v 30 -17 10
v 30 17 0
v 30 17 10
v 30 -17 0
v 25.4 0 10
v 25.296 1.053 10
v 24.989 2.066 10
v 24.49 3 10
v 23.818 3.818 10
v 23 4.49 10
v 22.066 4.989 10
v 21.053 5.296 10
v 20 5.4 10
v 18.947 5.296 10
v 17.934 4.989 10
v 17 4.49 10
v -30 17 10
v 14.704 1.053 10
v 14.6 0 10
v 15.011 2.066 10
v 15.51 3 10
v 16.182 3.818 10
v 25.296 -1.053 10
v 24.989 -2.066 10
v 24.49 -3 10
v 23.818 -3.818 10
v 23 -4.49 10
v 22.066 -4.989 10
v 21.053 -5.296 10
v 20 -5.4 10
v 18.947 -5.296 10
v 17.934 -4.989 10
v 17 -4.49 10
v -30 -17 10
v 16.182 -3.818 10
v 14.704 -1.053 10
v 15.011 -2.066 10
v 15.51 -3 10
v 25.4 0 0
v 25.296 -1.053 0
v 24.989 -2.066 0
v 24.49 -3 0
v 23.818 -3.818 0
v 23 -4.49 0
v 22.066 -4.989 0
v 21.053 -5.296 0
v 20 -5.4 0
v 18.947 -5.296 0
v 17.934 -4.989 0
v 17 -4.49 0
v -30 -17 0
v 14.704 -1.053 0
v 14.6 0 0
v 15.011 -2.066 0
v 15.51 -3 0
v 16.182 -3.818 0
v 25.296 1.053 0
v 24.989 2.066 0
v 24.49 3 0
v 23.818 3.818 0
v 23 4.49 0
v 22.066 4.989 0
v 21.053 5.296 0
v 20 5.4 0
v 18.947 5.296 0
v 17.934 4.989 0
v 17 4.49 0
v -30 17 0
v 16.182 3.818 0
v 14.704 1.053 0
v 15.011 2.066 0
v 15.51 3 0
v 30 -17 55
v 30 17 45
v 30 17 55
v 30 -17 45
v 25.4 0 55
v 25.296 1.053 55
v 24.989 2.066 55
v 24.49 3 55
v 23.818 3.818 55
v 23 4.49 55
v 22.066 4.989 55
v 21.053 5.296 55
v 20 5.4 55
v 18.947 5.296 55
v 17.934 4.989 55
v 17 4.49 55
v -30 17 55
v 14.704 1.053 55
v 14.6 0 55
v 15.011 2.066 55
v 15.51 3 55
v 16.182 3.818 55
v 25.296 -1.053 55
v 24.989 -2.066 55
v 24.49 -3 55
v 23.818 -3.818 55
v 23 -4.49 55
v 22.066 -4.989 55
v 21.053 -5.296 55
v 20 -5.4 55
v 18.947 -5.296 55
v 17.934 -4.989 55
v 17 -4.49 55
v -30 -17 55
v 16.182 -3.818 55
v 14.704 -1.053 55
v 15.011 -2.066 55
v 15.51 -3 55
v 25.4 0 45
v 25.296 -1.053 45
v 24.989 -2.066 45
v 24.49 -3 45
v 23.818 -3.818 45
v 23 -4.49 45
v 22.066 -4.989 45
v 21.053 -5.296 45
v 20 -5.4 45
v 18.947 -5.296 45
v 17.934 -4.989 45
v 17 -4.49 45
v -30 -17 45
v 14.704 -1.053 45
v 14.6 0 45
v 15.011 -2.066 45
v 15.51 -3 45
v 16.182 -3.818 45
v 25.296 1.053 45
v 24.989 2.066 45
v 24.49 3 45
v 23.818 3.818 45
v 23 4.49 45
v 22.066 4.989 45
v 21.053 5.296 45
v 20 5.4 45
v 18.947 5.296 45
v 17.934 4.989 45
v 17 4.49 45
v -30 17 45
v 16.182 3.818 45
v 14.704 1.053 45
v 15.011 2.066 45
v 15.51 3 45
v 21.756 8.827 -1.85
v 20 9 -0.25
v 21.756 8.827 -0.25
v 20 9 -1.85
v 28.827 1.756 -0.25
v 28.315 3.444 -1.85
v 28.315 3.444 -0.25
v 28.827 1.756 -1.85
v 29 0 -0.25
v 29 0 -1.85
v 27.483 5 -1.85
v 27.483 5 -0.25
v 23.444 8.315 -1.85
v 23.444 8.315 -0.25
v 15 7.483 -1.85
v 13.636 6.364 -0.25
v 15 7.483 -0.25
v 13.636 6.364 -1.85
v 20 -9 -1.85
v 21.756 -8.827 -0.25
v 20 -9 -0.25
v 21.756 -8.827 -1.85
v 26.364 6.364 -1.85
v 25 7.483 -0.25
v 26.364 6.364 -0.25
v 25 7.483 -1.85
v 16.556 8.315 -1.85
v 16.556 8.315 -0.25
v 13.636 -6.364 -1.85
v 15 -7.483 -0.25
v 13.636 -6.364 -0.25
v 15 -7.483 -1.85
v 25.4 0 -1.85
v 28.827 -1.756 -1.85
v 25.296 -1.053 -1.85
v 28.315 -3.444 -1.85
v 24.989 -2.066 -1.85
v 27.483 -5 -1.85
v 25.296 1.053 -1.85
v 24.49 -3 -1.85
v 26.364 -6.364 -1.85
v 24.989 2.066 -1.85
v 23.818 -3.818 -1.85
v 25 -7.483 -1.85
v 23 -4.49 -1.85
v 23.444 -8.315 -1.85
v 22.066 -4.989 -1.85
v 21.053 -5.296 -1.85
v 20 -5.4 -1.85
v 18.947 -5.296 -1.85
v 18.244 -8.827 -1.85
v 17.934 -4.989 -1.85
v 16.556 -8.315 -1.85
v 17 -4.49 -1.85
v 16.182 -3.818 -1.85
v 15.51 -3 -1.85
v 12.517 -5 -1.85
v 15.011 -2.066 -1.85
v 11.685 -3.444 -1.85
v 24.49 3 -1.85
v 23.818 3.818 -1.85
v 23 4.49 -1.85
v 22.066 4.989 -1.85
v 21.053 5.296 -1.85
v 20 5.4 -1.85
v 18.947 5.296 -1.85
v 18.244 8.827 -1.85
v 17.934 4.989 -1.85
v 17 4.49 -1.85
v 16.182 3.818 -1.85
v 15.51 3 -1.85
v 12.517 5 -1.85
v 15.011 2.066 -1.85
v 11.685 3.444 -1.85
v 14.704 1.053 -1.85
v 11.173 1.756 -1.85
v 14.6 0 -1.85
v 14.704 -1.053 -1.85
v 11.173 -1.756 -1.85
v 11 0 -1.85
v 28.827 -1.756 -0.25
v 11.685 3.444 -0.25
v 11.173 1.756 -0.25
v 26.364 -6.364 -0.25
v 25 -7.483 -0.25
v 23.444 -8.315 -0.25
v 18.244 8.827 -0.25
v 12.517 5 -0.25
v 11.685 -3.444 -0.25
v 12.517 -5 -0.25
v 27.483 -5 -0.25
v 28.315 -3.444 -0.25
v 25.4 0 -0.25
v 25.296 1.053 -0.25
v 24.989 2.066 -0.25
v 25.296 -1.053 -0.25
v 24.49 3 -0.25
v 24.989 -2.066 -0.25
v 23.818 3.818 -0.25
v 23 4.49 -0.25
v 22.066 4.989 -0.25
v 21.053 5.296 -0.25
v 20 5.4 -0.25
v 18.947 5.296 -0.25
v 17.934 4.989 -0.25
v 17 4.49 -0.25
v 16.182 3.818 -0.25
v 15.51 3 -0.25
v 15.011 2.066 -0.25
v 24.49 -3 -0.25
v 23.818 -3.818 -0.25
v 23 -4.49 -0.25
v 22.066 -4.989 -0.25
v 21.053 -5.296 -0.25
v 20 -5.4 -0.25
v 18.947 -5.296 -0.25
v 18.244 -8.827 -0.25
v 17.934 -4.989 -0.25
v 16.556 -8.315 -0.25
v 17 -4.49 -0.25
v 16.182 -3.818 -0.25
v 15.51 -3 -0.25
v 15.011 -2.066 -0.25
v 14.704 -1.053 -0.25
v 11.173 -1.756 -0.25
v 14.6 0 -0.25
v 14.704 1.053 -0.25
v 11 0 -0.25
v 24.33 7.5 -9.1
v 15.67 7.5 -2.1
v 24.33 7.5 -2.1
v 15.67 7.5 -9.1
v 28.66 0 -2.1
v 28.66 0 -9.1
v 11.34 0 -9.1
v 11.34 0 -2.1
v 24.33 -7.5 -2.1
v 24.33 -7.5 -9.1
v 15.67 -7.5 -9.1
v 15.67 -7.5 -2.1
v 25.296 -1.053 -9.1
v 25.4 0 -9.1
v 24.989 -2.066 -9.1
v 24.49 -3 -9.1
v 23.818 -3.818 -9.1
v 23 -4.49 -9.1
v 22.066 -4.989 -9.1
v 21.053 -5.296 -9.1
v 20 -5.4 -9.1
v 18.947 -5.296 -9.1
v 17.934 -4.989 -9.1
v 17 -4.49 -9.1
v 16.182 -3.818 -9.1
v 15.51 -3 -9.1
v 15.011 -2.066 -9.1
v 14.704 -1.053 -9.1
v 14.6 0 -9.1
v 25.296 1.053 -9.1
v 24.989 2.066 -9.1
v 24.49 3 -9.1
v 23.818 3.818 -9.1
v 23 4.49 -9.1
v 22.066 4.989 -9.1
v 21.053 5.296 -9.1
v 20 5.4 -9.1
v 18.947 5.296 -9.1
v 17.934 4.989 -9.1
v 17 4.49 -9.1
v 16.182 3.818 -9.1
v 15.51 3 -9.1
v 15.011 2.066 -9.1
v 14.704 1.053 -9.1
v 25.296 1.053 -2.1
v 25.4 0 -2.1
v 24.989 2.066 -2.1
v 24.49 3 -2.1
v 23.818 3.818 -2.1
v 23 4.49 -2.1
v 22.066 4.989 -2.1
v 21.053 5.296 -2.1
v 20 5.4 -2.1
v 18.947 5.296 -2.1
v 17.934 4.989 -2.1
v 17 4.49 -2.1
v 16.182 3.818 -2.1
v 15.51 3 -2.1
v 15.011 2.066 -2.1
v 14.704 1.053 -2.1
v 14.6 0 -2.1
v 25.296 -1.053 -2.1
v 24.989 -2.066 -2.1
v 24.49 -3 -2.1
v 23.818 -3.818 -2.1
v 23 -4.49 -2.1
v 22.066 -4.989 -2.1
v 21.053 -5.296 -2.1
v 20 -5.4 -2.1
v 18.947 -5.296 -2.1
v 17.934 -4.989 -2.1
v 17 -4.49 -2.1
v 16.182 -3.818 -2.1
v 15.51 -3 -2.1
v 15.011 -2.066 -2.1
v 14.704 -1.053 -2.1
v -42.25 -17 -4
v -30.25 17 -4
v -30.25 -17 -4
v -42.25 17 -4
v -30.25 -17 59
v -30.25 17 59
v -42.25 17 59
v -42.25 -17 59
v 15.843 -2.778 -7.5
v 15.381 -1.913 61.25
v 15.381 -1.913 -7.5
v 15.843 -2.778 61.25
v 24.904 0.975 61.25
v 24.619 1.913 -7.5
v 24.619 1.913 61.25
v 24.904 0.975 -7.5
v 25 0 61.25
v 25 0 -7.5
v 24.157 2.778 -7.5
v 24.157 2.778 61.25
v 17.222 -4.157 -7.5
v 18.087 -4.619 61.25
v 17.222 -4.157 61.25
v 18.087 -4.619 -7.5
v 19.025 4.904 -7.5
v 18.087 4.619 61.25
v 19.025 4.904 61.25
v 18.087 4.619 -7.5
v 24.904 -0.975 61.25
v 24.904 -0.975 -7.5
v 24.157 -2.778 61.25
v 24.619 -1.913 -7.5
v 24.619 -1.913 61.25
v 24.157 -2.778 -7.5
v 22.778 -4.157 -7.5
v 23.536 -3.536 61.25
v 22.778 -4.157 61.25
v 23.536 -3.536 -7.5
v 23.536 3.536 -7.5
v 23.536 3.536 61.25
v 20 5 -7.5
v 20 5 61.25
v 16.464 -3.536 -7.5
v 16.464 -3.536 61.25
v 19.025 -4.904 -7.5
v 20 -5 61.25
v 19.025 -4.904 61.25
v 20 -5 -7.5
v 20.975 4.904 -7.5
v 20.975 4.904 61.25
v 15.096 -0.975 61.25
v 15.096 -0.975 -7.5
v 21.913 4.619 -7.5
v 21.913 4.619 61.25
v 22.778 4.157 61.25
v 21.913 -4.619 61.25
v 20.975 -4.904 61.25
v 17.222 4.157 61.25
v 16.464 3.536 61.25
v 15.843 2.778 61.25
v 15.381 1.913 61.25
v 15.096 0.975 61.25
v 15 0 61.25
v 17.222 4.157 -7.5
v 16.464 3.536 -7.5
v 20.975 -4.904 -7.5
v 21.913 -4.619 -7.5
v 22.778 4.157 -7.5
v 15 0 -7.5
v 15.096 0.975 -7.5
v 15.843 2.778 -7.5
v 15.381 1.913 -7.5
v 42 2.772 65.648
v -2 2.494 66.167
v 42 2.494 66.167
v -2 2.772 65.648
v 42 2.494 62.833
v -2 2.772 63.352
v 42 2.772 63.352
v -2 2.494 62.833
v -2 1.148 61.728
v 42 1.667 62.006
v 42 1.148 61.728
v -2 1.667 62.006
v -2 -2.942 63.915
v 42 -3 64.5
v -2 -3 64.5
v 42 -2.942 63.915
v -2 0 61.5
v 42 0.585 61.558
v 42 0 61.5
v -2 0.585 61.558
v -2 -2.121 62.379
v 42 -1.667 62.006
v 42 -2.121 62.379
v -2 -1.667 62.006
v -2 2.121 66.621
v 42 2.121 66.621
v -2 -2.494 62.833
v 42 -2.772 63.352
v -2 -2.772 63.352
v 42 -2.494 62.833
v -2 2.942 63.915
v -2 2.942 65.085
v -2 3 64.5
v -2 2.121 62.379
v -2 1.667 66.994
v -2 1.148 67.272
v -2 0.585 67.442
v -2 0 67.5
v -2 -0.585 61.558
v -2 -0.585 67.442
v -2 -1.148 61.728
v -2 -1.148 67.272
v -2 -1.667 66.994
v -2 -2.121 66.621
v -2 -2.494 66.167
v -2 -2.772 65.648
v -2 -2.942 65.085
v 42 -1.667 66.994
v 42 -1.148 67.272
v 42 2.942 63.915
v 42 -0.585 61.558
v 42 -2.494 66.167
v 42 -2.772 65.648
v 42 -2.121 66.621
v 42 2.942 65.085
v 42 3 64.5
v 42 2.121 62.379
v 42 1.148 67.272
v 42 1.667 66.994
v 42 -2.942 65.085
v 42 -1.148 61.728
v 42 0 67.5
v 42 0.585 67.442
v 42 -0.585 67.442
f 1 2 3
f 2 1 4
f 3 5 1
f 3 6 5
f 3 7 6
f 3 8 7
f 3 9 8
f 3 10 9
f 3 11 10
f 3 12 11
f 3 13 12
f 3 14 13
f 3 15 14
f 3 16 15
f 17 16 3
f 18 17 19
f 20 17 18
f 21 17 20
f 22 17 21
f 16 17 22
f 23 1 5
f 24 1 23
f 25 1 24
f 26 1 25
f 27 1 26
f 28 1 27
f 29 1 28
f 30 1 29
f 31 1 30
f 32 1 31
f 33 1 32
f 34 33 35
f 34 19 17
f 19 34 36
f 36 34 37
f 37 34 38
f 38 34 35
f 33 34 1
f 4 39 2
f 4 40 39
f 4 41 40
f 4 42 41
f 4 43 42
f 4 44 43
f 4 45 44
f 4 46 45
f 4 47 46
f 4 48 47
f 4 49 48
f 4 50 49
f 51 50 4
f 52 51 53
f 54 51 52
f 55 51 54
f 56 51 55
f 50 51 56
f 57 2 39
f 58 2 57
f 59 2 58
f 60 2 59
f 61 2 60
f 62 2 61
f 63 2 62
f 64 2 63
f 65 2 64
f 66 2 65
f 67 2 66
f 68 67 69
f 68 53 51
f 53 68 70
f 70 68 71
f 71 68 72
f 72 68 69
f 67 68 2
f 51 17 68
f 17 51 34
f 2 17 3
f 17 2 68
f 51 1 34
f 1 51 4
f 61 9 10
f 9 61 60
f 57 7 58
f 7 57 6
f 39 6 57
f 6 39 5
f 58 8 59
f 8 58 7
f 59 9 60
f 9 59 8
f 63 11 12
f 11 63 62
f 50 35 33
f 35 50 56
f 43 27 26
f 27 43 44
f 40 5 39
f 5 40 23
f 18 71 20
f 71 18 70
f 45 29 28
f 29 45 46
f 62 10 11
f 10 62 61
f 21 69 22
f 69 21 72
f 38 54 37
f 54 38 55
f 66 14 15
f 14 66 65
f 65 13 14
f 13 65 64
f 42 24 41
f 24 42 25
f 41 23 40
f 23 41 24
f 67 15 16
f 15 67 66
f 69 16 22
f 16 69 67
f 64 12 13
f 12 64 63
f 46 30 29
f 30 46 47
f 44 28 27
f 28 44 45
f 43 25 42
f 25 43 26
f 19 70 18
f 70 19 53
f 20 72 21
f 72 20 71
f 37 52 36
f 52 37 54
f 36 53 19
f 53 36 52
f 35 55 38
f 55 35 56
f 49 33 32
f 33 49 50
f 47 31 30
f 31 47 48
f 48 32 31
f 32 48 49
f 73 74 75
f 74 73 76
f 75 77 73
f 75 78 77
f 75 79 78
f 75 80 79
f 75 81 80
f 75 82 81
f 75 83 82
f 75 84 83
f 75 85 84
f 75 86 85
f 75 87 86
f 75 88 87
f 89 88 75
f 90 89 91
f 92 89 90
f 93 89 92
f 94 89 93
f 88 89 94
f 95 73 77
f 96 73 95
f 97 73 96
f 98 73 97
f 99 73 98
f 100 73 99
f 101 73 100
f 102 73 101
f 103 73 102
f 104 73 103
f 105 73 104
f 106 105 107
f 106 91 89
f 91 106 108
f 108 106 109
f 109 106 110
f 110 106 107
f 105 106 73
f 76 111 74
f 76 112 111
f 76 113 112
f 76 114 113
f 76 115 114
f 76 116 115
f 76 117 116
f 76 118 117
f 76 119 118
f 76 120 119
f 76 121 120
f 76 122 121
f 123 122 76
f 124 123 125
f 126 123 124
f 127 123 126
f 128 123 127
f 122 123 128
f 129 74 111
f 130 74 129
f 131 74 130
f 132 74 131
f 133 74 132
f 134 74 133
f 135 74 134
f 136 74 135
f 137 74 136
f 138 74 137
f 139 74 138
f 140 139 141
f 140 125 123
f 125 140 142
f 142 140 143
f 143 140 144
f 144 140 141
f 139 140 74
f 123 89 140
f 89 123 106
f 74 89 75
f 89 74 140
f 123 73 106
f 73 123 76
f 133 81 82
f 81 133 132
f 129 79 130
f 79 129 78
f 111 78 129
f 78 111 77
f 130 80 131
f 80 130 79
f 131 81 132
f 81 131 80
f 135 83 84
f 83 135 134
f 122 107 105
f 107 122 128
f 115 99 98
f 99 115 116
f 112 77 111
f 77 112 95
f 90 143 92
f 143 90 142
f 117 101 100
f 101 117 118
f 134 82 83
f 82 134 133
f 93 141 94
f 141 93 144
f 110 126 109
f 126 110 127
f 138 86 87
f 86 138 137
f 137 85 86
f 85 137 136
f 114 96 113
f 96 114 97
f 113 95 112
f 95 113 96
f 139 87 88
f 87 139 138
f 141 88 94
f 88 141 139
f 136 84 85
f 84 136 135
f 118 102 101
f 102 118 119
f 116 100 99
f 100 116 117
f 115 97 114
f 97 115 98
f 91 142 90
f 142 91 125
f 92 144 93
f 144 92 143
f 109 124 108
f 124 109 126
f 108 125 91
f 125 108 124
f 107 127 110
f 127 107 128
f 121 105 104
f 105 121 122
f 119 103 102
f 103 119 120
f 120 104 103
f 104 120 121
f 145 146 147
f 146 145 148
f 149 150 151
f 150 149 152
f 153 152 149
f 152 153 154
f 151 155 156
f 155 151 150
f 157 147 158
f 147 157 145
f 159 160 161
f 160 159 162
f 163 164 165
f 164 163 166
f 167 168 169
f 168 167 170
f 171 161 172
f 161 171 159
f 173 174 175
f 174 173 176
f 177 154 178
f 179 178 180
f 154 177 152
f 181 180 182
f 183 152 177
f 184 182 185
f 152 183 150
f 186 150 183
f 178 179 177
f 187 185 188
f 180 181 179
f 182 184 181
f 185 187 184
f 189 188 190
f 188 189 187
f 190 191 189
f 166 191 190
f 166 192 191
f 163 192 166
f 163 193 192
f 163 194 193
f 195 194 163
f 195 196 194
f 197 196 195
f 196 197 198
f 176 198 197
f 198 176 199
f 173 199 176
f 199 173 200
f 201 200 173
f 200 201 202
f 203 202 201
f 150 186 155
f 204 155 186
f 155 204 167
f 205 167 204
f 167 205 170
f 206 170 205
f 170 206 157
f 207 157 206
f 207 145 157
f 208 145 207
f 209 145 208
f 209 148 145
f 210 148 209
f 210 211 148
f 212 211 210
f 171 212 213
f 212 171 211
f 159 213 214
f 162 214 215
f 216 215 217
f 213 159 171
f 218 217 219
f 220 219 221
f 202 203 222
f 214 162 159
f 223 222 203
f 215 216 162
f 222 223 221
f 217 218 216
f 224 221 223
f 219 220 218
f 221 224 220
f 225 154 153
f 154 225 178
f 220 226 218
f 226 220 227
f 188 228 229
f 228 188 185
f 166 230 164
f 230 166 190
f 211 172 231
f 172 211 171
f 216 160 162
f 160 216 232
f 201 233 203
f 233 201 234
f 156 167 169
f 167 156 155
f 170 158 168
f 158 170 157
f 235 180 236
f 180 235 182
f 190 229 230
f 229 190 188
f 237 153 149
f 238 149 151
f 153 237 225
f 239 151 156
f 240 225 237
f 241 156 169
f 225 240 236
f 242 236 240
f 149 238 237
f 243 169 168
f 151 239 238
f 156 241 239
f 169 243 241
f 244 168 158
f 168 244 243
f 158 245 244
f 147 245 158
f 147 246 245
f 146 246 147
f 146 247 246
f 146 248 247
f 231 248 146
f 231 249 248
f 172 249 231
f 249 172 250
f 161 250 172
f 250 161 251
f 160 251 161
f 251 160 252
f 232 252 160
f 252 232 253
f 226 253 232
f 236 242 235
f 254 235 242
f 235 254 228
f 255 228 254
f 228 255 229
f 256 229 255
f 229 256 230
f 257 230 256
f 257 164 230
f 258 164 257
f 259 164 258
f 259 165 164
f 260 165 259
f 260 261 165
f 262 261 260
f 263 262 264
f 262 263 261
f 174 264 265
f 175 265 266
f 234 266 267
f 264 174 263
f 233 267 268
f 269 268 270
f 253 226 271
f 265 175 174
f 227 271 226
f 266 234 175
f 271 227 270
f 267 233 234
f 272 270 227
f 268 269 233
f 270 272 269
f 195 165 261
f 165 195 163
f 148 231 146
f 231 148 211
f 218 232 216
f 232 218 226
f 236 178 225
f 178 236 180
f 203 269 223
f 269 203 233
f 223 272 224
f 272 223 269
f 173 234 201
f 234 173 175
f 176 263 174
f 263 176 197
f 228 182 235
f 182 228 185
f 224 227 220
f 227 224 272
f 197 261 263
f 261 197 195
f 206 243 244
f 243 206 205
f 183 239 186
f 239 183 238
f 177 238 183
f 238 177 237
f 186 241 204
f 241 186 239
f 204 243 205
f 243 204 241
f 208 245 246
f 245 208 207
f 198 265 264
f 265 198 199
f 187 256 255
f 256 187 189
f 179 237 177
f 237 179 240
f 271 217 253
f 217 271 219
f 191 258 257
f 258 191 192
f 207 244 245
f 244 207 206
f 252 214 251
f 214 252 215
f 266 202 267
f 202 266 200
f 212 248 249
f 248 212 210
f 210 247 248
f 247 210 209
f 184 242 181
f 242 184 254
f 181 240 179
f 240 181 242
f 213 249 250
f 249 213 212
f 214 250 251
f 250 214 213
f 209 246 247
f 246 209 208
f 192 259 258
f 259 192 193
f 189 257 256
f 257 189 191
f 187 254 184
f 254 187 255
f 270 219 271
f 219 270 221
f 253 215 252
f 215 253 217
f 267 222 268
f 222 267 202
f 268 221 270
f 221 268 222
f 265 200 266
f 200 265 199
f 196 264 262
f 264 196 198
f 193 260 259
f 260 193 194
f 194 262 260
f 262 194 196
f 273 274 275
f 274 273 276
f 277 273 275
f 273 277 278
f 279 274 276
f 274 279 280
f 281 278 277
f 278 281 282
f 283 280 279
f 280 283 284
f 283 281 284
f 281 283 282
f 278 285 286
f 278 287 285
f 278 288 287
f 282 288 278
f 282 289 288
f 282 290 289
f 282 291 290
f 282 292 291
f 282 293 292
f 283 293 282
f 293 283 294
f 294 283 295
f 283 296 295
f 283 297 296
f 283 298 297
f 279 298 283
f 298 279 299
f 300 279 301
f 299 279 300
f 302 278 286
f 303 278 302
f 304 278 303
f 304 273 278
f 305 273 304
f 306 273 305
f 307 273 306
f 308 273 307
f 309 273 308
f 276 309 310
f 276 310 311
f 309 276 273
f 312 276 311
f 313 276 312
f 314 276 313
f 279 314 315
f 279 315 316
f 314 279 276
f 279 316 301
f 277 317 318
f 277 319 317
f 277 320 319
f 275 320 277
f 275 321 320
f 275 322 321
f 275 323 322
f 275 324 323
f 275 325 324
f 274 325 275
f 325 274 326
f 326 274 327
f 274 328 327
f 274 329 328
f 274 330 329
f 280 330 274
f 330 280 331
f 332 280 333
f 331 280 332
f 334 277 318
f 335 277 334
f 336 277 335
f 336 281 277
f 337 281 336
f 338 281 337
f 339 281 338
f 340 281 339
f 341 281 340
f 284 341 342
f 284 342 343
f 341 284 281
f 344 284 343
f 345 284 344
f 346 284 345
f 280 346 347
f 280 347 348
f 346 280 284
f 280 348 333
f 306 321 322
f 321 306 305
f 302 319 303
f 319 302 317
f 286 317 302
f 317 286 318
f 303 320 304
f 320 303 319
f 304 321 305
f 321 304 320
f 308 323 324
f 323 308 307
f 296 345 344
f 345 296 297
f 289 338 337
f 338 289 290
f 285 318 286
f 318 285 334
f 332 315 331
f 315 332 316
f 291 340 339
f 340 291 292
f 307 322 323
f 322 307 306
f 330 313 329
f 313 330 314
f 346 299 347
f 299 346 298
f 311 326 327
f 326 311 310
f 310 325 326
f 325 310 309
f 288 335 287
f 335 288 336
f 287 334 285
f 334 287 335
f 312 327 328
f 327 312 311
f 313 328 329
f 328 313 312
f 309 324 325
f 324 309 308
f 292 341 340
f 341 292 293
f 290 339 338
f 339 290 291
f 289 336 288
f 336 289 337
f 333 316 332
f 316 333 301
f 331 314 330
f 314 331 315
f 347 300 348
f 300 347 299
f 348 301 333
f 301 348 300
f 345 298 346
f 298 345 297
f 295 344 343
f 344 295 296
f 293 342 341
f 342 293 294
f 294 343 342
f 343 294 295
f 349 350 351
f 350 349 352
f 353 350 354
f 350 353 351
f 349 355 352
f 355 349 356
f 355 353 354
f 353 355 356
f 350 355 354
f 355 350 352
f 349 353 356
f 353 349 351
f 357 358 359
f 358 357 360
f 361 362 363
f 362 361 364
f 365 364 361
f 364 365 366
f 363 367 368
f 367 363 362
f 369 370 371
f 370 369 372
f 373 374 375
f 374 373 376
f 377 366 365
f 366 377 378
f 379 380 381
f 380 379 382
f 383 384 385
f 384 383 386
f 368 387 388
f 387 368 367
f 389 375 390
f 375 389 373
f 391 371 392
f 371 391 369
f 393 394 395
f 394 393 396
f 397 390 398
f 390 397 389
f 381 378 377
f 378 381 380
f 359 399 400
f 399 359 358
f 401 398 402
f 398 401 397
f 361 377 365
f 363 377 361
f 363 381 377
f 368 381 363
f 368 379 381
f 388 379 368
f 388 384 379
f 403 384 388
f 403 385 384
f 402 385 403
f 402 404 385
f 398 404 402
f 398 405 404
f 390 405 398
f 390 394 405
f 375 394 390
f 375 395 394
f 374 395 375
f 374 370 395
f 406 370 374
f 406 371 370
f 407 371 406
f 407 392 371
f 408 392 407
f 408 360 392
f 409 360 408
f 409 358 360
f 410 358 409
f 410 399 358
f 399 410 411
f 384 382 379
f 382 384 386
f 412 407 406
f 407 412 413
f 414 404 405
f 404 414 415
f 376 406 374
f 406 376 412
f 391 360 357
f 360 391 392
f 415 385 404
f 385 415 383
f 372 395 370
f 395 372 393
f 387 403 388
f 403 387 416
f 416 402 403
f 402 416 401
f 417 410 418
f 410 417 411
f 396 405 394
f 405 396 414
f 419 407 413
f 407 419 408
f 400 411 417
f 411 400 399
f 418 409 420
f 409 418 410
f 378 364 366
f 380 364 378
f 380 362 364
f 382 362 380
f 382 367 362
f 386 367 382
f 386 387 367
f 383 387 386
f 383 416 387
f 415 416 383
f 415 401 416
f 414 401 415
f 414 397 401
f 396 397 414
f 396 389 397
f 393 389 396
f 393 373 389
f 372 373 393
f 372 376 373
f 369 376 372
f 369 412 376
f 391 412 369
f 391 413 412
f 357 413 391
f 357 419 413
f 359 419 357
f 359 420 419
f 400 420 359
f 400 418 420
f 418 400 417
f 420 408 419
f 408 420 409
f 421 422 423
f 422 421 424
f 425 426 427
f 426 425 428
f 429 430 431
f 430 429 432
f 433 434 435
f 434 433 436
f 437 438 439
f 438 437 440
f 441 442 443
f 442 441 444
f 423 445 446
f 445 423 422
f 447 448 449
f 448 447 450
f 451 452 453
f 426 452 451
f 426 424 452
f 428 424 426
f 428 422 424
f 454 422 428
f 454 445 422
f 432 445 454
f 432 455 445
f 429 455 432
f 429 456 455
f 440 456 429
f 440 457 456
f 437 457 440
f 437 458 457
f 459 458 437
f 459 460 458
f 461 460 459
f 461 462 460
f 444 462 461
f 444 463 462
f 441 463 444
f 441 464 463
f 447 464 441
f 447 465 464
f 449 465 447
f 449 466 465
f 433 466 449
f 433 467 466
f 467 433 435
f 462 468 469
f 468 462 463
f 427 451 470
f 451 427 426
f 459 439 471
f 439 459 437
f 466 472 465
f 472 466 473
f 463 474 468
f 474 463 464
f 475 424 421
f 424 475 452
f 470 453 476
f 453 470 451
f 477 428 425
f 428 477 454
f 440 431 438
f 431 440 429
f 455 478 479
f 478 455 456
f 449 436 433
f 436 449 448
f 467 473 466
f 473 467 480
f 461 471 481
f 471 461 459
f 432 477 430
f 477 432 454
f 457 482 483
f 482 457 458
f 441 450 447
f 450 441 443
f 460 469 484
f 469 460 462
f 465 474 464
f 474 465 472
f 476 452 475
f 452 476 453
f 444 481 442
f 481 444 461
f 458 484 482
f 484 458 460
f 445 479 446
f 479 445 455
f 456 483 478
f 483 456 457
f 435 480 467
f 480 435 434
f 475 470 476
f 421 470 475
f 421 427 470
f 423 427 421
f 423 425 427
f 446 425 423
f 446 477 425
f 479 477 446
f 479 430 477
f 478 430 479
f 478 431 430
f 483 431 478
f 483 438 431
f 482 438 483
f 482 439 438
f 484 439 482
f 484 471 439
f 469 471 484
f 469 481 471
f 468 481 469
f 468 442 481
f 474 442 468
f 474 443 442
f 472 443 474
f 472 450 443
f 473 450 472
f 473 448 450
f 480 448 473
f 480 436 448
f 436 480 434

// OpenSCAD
$fn = 32;

// ------------------------------------------------------------------------
// C clamp: throat 45 mm, screw d10
// Every part is its own module, assembly() places every instance.
// ------------------------------------------------------------------------

// --- part 1 ---
module clamp_arm() {
  difference() {
    translate([-30, -17, 0]) cube([60, 34, 10]);
    translate([20, 0, -1]) cylinder(h = 12, d = 10.8);
  }
}

// --- part 2 ---
module clamp_spine() {
  difference() {
    translate([-31.5, -17, 0]) cube([63, 34, 12]);
  }
}

// --- part 3 ---
module clamp_screw() {
  translate([0, 0, -34.375]) cylinder(h = 68.75, d = 10);
}

// --- part 4 ---
module clamp_washer() {
  difference() {
      translate([0, 0, 0]) cylinder(h = 1.6, d = 18);
      translate([0, 0, -1]) cylinder(h = 3.6, d = 10.8);
    }
}

// --- part 5 ---
module clamp_nut() {
  difference() {
    linear_extrude(height = 7) polygon(points = [[8.66, 0], [4.33, 7.5], [-4.33, 7.5], [-8.66, 0], [-4.33, -7.5], [4.33, -7.5]]);
    translate([0, 0, -1]) cylinder(h = 9, d = 10.8);
  }
}

// --- part 6 ---
module tommy_bar() {
  translate([0, 0, -22]) cylinder(h = 44, d = 6);
}

// --- assembly ---
module assembly() {
  color([0.80, 0.24, 0.20]) translate([0, 0, 0]) rotate([0, 0, 0]) clamp_arm();
  color([0.20, 0.45, 0.75]) translate([0, 0, 45]) rotate([0, 0, 0]) clamp_arm();
  color([0.25, 0.62, 0.32]) translate([-42.25, 0, 27.5]) rotate([0, 90, 0]) clamp_spine();
  color([0.92, 0.70, 0.18]) translate([20, 0, 26.875]) rotate([0, 0, 0]) clamp_screw();
  color([0.58, 0.35, 0.70]) translate([20, 0, -1.85]) rotate([0, 0, 0]) clamp_washer();
  color([0.16, 0.66, 0.66]) translate([20, 0, -9.1]) rotate([0, 0, 0]) clamp_nut();
  color([0.85, 0.48, 0.18]) translate([20, 0, 64.5]) rotate([0, 90, 0]) tommy_bar();
}

assembly();
